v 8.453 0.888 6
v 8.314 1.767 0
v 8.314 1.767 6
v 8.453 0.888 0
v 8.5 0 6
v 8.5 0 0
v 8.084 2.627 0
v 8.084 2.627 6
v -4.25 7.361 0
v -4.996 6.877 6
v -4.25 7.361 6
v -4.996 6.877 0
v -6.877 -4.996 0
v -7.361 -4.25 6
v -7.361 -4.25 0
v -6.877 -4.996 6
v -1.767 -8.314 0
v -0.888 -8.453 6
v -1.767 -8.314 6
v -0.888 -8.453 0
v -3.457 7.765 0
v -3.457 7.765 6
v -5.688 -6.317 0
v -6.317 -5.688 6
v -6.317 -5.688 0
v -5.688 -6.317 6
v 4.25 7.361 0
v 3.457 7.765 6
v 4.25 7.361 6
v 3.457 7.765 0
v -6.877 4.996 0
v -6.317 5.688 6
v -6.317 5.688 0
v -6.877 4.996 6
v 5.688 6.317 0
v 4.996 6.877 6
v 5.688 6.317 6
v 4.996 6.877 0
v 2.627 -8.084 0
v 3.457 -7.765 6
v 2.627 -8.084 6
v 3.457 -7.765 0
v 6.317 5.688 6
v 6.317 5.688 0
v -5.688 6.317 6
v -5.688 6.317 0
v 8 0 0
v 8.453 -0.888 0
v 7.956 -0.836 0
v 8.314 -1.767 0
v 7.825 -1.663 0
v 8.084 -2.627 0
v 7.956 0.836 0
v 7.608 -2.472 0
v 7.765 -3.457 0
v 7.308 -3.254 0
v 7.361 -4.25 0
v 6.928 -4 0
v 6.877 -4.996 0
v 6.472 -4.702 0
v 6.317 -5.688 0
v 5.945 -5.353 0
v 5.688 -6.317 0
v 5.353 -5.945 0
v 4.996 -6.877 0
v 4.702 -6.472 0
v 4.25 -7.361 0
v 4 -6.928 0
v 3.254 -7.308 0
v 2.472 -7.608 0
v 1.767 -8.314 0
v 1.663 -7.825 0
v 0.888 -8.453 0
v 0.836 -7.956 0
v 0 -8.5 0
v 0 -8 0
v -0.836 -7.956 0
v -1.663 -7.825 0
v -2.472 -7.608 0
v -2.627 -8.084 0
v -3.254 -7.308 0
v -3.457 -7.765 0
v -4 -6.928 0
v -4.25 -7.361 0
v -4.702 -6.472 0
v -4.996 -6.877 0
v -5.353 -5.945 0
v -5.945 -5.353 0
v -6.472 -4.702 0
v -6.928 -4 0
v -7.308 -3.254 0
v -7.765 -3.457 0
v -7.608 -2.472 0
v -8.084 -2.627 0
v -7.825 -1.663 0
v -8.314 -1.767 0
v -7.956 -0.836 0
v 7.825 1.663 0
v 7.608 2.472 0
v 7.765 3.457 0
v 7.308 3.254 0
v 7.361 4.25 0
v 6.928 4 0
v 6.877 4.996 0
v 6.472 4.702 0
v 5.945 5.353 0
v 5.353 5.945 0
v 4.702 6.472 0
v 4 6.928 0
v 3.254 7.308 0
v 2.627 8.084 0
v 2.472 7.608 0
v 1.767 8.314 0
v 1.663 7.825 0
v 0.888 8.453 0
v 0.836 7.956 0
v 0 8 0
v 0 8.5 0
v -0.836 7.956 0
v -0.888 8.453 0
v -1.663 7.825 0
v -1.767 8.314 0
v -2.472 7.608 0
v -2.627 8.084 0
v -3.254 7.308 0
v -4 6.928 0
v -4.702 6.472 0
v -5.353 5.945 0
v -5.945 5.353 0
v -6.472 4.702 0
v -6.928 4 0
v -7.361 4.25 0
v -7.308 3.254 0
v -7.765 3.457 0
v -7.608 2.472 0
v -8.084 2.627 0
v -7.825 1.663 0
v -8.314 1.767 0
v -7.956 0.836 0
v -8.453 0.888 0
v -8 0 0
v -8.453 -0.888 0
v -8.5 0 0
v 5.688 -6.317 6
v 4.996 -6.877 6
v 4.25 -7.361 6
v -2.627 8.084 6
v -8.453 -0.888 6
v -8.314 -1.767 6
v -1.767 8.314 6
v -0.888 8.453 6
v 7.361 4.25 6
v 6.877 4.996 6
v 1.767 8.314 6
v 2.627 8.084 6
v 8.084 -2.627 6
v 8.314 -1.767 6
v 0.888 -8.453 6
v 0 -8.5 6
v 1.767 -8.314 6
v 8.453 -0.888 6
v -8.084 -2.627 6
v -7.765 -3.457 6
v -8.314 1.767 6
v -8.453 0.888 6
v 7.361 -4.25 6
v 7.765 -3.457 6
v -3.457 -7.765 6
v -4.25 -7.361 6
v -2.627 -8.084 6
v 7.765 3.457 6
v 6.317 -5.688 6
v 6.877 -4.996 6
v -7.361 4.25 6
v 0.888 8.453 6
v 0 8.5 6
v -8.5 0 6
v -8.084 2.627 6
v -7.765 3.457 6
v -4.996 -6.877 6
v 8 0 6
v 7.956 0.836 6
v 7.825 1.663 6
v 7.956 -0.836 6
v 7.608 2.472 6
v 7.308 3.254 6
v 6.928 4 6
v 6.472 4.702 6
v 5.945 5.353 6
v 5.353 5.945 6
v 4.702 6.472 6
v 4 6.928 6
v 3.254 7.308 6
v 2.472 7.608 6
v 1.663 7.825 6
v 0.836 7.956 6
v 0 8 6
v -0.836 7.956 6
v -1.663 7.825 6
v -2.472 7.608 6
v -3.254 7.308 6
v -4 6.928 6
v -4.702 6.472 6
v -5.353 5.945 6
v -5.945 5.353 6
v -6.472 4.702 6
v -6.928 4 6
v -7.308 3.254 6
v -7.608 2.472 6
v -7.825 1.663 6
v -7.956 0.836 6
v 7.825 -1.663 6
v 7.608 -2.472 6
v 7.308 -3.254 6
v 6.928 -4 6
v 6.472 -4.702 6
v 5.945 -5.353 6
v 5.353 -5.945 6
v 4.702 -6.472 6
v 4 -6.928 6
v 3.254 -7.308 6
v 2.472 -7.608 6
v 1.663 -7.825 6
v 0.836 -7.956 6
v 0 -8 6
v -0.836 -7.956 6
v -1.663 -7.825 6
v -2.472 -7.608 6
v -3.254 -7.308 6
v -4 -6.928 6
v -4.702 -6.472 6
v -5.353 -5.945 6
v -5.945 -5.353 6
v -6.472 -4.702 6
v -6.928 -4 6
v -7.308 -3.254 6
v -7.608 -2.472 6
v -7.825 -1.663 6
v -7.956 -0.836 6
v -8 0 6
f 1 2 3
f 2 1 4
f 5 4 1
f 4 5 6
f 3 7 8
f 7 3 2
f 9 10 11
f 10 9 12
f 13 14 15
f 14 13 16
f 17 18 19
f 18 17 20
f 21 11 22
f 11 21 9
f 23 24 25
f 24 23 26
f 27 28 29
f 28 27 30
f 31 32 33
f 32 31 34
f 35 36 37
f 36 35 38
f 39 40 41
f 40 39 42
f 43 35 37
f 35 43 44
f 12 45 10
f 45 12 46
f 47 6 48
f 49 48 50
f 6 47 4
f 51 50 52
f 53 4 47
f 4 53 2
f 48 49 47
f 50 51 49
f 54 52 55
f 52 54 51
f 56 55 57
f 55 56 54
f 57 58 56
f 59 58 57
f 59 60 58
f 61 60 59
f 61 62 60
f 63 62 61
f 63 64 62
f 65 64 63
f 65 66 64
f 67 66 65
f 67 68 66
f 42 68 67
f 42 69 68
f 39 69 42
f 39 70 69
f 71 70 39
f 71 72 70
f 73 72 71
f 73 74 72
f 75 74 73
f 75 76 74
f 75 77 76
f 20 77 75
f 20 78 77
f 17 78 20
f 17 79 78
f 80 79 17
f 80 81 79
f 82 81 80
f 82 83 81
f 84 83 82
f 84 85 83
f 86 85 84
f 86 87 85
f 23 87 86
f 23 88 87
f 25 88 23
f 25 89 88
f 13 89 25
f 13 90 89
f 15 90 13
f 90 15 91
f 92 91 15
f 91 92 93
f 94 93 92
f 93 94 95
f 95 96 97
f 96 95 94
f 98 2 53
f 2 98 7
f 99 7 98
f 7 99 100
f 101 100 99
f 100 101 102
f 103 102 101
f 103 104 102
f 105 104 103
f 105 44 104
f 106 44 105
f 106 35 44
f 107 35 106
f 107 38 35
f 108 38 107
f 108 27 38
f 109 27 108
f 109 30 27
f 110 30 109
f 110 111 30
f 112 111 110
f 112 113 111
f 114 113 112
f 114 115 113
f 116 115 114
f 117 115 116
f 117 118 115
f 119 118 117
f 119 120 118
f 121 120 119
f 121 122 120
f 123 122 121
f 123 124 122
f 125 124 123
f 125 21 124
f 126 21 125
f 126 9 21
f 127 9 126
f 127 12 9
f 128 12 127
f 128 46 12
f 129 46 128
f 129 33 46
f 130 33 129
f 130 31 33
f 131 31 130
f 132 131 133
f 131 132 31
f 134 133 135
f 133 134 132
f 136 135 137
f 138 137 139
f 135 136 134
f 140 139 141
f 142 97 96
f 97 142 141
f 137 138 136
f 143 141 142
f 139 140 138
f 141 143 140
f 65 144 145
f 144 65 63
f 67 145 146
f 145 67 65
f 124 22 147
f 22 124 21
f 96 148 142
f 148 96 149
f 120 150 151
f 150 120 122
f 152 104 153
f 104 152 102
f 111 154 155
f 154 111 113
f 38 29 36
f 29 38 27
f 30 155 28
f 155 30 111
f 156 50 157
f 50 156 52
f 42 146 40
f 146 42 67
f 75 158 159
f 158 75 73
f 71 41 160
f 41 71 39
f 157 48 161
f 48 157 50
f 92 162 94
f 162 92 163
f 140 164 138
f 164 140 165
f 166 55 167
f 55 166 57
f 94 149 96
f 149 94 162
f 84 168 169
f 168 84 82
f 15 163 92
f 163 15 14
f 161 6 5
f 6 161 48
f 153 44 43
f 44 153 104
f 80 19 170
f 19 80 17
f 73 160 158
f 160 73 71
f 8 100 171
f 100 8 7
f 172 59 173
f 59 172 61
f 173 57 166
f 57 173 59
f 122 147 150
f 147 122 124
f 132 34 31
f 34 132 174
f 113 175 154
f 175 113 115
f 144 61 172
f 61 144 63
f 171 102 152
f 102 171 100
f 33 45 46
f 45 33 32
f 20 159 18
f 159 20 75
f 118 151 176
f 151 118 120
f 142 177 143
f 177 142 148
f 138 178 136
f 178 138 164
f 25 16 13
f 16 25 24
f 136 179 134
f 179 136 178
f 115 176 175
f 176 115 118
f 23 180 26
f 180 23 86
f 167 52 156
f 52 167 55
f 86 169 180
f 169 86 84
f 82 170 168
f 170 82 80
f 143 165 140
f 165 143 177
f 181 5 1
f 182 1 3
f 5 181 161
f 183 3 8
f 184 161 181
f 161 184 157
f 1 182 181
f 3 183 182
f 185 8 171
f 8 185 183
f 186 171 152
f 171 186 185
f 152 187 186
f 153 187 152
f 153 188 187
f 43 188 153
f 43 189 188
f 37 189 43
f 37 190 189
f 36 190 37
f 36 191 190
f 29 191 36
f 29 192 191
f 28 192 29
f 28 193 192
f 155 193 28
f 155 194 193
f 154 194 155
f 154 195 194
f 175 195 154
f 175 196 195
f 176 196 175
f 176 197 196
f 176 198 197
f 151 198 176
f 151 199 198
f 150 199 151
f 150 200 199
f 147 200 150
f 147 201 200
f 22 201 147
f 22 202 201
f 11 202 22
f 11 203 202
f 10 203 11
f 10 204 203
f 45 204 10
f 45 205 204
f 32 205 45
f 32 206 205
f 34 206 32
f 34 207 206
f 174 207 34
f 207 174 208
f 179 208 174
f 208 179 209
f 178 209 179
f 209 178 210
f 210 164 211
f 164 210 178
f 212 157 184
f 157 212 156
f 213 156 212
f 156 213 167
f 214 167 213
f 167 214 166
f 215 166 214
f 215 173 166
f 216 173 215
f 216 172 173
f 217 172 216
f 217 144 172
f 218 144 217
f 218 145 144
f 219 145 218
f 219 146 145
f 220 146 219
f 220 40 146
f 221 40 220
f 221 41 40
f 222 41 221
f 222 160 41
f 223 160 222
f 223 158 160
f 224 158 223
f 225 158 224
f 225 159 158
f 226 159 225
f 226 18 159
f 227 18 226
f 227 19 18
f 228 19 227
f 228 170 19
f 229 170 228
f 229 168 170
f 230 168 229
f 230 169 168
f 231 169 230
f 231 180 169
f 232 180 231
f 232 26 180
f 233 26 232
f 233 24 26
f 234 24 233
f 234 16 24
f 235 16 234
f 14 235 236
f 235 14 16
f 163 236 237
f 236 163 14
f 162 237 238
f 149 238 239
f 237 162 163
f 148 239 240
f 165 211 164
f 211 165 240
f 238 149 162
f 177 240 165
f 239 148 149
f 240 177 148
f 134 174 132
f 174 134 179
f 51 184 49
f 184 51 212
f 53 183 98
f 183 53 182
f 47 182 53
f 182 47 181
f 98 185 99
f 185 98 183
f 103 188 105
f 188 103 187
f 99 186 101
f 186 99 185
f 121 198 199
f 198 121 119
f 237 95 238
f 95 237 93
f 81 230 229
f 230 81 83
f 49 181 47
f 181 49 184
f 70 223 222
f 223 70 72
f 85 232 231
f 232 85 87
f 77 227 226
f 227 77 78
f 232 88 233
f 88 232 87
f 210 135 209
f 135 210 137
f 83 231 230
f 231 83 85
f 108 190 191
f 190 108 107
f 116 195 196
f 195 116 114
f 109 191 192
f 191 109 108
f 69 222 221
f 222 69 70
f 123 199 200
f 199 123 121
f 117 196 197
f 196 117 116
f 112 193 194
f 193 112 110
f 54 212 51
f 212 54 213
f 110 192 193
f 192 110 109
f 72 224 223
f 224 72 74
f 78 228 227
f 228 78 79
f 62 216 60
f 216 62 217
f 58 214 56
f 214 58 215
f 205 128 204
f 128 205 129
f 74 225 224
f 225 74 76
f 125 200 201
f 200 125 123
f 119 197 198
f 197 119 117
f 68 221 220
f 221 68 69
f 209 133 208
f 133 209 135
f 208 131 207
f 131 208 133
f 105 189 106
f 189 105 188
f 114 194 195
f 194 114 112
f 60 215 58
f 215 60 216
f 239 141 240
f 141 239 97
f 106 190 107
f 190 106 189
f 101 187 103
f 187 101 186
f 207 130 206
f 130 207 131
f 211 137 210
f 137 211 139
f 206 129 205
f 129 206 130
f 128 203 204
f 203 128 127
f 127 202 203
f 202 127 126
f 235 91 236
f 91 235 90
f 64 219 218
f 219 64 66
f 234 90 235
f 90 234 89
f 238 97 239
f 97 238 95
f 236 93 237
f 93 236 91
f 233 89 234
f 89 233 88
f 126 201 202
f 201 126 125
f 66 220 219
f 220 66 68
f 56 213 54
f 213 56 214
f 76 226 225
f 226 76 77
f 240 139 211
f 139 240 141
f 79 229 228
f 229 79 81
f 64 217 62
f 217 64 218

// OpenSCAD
$fn=60;

difference(){
union(){
cylinder(h = 6, d = 17);

}
translate([0,0,-1])
cylinder(h = 10, d = 16);
}
